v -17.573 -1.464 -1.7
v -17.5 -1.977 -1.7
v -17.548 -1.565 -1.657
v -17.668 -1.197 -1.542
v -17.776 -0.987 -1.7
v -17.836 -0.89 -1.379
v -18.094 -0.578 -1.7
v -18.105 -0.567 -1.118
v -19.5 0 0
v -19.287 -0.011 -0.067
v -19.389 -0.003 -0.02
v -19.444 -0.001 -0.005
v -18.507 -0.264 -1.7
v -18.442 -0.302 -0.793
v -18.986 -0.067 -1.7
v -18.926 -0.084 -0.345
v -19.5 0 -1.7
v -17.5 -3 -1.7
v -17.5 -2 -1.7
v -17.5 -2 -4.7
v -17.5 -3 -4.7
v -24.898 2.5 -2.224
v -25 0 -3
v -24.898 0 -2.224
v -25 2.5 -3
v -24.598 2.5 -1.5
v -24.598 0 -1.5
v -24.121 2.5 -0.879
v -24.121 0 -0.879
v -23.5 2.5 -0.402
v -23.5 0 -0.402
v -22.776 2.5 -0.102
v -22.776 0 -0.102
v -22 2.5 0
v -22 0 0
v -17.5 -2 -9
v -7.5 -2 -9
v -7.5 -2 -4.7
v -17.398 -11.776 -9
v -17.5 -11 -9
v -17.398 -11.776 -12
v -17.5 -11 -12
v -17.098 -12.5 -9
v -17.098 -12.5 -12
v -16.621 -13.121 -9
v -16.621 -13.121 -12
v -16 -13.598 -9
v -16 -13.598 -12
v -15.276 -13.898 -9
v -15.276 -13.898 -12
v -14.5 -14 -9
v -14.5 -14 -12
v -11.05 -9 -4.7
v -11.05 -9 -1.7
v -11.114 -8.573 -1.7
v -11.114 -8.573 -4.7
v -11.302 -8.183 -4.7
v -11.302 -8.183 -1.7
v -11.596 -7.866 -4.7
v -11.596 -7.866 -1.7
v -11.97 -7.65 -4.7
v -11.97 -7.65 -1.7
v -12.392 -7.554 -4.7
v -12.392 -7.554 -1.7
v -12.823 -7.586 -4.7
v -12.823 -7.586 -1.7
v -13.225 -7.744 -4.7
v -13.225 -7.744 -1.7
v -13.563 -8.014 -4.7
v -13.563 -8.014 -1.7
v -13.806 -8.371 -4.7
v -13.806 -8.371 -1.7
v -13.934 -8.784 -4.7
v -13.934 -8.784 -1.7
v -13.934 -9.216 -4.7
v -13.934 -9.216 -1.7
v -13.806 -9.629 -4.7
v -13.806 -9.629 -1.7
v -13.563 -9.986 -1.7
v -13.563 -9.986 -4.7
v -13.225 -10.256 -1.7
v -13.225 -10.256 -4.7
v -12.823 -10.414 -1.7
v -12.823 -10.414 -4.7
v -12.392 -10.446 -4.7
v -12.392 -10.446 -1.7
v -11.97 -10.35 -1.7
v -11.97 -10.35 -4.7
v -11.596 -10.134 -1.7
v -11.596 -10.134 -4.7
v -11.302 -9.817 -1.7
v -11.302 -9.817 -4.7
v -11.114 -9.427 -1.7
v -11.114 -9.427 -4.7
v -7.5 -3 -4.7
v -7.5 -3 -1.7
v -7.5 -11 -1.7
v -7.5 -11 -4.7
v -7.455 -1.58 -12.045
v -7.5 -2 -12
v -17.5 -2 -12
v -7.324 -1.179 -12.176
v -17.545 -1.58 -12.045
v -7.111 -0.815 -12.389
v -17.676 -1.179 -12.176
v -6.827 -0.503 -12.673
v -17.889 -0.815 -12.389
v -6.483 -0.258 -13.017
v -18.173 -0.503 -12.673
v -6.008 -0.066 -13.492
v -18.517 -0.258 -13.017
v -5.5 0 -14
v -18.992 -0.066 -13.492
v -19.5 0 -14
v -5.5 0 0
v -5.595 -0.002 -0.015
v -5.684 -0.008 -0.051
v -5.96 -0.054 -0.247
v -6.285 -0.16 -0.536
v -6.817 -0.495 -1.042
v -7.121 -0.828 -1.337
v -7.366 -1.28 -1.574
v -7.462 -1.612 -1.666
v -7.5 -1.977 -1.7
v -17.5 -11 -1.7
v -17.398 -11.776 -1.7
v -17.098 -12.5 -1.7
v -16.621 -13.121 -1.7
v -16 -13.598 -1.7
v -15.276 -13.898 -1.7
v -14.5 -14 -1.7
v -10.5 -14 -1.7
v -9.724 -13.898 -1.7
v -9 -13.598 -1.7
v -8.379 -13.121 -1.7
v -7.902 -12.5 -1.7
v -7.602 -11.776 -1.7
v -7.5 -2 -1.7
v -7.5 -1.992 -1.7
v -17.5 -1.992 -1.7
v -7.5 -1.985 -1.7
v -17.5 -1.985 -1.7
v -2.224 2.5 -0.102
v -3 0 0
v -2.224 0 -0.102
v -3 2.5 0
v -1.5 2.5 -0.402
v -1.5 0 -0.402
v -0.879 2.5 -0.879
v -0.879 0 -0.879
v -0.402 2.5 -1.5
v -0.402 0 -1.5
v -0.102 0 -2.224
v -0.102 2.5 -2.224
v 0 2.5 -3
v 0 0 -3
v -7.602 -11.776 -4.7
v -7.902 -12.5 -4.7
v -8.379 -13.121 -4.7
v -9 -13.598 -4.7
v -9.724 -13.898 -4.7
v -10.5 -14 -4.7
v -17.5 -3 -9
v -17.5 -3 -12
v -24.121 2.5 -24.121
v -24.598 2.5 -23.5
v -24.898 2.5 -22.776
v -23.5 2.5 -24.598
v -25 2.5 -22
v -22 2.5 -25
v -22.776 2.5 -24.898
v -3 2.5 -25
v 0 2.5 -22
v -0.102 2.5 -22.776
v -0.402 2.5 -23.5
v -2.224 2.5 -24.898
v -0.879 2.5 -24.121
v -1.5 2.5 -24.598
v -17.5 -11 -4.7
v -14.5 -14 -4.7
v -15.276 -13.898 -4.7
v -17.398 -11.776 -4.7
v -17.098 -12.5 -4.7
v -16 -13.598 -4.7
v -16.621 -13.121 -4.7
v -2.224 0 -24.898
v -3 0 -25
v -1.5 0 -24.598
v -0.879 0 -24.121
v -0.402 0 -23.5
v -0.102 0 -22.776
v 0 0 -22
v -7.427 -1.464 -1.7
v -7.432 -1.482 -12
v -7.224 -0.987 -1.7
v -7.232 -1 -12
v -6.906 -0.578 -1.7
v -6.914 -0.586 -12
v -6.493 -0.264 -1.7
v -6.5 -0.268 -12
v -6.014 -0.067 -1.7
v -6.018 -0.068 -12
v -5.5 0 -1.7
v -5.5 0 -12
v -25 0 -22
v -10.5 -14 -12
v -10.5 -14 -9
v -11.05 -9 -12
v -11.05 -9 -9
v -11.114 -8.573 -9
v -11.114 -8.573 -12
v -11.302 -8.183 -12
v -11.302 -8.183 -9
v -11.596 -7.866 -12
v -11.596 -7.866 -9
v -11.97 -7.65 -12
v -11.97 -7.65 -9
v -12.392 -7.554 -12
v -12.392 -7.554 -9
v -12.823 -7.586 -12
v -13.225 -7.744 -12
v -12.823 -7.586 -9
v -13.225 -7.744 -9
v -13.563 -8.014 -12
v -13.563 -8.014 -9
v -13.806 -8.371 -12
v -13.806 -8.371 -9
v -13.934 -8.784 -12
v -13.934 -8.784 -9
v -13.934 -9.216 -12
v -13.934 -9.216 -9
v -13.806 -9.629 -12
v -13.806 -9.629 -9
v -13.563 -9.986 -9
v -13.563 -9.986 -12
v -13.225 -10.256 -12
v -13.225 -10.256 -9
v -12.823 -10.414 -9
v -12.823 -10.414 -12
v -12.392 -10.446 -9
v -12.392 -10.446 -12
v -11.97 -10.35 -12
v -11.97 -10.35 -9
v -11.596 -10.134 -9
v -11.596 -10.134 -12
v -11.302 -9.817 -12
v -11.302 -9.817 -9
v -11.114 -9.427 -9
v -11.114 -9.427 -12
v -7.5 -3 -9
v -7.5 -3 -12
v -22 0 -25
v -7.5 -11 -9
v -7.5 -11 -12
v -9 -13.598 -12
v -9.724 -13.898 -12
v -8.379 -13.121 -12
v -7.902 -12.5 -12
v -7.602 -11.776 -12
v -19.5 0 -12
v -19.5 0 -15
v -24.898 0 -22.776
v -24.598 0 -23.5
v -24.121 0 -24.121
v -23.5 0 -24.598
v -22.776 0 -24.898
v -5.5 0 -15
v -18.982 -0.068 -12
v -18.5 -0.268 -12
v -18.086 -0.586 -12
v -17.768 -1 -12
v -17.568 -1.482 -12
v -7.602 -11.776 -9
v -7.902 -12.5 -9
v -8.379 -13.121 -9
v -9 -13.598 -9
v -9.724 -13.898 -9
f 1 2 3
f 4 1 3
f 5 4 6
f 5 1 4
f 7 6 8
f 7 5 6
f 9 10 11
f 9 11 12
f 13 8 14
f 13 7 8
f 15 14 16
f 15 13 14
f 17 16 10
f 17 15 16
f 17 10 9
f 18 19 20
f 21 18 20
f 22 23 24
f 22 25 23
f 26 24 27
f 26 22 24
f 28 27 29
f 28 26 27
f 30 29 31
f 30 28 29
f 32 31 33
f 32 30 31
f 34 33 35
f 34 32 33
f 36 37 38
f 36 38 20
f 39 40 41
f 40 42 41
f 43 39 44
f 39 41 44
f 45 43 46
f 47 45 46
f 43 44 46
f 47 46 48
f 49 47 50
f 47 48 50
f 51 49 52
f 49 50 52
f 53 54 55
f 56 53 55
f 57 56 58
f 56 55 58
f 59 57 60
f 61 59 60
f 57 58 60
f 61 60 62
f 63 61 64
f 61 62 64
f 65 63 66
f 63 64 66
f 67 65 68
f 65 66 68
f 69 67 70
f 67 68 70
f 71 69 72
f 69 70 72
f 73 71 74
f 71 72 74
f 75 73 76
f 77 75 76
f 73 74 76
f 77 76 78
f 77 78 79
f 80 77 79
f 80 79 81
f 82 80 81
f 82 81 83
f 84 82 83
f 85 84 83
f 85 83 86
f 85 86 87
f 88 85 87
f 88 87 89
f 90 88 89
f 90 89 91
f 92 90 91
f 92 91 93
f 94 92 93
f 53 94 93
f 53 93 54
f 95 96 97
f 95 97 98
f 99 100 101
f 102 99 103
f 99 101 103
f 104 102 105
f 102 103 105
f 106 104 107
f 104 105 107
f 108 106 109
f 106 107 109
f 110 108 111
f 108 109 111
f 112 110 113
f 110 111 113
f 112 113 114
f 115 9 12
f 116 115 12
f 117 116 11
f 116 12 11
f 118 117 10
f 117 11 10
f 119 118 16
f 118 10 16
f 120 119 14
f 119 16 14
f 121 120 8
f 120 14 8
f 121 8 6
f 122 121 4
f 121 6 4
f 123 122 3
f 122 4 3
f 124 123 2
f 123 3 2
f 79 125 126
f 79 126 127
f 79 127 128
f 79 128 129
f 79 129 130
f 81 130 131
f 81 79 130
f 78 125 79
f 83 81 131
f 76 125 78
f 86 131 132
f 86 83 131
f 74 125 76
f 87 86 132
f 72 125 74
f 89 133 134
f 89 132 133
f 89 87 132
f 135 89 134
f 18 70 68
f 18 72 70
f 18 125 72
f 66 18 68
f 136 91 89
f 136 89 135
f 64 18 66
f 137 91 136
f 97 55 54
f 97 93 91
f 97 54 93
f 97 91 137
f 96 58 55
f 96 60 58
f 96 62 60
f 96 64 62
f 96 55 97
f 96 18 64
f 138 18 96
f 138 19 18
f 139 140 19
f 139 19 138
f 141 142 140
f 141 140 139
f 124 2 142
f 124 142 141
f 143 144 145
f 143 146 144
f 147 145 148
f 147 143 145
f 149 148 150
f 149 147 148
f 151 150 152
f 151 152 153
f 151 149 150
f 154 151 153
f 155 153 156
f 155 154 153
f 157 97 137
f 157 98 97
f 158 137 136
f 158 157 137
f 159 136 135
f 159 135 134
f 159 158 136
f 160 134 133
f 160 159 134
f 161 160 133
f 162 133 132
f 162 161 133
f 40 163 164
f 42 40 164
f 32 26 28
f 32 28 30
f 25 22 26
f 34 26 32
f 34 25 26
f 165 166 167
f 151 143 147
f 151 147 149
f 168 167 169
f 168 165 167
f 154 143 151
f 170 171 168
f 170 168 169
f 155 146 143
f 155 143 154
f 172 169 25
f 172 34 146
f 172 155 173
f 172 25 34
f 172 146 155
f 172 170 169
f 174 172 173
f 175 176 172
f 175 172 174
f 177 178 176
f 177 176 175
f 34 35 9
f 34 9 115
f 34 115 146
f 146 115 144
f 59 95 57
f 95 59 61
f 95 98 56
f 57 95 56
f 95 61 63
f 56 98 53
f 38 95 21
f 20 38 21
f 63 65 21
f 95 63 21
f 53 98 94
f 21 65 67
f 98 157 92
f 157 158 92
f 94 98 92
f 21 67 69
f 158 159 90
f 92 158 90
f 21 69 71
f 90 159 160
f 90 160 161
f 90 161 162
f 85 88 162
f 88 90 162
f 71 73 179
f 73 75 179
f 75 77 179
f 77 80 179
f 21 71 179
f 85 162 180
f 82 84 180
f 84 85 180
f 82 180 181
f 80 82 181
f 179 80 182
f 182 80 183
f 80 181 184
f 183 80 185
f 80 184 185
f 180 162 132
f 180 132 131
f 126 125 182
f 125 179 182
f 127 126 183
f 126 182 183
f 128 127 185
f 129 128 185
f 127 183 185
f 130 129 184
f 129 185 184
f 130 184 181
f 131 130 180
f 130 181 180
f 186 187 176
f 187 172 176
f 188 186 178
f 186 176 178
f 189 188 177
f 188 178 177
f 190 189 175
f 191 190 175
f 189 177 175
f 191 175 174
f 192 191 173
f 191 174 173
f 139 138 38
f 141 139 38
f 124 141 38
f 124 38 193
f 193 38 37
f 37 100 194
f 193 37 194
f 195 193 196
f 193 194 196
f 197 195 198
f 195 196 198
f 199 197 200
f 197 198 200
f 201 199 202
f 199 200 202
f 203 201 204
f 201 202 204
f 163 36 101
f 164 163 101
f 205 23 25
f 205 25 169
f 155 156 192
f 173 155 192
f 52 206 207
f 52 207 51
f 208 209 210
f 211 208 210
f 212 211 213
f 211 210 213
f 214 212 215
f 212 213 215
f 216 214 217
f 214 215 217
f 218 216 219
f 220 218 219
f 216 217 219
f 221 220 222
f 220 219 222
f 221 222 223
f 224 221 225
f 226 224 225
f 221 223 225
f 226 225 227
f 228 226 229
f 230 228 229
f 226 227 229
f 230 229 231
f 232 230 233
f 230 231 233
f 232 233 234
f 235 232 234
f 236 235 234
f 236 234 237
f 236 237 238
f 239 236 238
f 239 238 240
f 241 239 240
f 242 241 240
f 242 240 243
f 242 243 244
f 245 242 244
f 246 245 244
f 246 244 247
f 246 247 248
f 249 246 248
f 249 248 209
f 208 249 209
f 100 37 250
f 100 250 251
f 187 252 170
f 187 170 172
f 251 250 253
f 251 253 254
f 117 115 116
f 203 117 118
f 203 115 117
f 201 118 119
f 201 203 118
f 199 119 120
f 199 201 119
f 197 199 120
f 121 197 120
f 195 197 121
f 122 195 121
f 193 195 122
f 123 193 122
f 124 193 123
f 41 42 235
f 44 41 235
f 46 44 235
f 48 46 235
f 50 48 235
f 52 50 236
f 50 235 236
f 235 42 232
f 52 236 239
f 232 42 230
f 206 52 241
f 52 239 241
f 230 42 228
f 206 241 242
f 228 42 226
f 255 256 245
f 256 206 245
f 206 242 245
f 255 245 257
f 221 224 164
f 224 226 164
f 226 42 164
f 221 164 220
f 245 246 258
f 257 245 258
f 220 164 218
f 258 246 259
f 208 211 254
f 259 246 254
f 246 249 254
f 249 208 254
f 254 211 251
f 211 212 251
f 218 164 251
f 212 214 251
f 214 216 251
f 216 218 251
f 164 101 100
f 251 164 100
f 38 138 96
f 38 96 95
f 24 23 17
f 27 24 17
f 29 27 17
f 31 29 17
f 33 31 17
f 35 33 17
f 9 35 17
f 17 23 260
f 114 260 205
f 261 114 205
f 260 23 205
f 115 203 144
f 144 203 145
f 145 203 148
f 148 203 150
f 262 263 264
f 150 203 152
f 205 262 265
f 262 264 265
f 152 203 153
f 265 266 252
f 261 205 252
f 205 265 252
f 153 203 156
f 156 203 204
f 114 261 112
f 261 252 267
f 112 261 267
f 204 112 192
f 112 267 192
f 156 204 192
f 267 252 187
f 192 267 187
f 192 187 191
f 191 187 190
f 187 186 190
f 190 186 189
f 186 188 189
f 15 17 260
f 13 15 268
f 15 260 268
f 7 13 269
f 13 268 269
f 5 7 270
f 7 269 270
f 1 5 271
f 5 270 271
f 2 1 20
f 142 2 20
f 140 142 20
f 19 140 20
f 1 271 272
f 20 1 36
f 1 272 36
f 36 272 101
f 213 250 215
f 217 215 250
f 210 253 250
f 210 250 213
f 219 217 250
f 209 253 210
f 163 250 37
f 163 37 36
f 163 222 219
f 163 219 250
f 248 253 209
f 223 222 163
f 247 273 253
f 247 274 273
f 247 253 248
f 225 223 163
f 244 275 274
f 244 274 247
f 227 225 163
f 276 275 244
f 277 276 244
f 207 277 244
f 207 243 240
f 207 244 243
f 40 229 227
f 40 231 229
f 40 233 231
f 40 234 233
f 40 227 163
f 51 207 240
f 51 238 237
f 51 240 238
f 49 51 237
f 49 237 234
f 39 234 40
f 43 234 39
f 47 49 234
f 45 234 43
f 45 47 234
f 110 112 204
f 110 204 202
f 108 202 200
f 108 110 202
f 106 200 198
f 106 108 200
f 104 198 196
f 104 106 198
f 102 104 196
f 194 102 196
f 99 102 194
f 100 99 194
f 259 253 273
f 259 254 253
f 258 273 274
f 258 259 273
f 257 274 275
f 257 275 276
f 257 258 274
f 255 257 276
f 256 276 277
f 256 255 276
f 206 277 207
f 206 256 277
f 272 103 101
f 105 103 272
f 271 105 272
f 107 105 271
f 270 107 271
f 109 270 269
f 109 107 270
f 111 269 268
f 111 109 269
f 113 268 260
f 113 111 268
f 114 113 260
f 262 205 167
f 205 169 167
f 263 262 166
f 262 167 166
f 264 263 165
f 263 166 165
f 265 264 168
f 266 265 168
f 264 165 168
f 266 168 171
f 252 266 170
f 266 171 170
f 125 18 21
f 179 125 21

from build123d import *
from build123d.topology import SkipClean

# Parameters (mm, degrees)
SKETCH1_W           = 25
SKETCH1_H           = 25
BOSS_EXTRUDE1_DEPTH = 2.5
SKETCH2_W           = 10
SKETCH2_H           = 10.3
BOSS_EXTRUDE2_DEPTH = 14
SKETCH3_W           = 10
SKETCH3_H           = 4.3
CUT_EXTRUDE1_DEPTH  = 12
SKETCH4_R           = 1.45
CUT_EXTRUDE2_DEPTH  = 37.930881387
FILLET1_R           = 3
FILLET2_R           = 3
FILLET3_START       = -12
FILLET3_DEPTH       = 10.3
FILLET3_START_2     = -19.5000001
FILLET3_2_DEPTH     = 14.0000001
FILLET3_START_3     = -15
FILLET3_3_DEPTH     = 15.00001976


with BuildPart() as part:
    # Sketch1 → Boss-Extrude1 (new body)
    with BuildSketch(Plane(origin=(0, 0, 0), x_dir=(1, 0, 0), z_dir=(0, 1, 0))):
        with Locations((-12.5, 12.5)):
            Rectangle(SKETCH1_W, SKETCH1_H)
    extrude(amount=BOSS_EXTRUDE1_DEPTH)

    # Sketch2 → Boss-Extrude2 (add)
    with BuildSketch(Plane(origin=(0, 0, 0), x_dir=(-1, 0, 0), z_dir=(0, -1, 0))):
        with Locations((12.5, 6.85)):
            Rectangle(SKETCH2_W, SKETCH2_H)
    extrude(amount=BOSS_EXTRUDE2_DEPTH)

    # Sketch3 → Cut-Extrude1 (cut)
    with BuildSketch(Plane(origin=(0, -14, 0), x_dir=(-1, 0, 0), z_dir=(0, -1, 0))):
        with Locations((12.5, 6.85)):
            Rectangle(SKETCH3_W, SKETCH3_H)
    extrude(amount=-CUT_EXTRUDE1_DEPTH, mode=Mode.SUBTRACT)

    # Sketch4 → Cut-Extrude2 (cut, through all)
    with BuildSketch(Plane.XY.offset(-1.7)):
        with Locations((-12.5, -9)):
            Circle(SKETCH4_R)
    extrude(amount=-CUT_EXTRUDE2_DEPTH, mode=Mode.SUBTRACT)

    # Fillet1
    fillet1_edges = [part.edges().sort_by_distance(p)[0] for p in [
        (-17.5, -14, -3.2),
        (-7.5, -14, -10.5),
        (-17.5, -14, -10.5),
        (-7.5, -14, -3.2),
    ]]
    fillet(fillet1_edges, radius=FILLET1_R)

    # Fillet2
    fillet2_edges = [part.edges().sort_by_distance(p)[0] for p in [
        (0, 1.25, 0),
        (-25, 1.25, 0),
        (-25, 1.25, -25),
        (0, 1.25, -25),
    ]]
    fillet(fillet2_edges, radius=FILLET2_R)

    # Fillet3: read off the stored shape, not the designer's step
    # Fillet3 outline → Fillet3 (add)
    with BuildSketch(Plane.XY.offset(FILLET3_START)):
        with BuildLine():
            Line((-7.5, 0), (-7.5, -2))
            ThreePointArc((-7.5, -2), (-6.914213562, -0.585786438), (-5.5, 0))
            Line((-5.5, 0), (-7.5, 0))
        make_face()
        with BuildLine():
            Line((-17.5, -2), (-17.5, 0))
            Line((-17.5, 0), (-19.5, 0))
            ThreePointArc((-19.5, 0), (-18.085786438, -0.585786438), (-17.5, -2))
        make_face()
    extrude(amount=FILLET3_DEPTH)

    # Fillet3 2 outline → Fillet3 2 (add)
    with BuildSketch(Plane.YZ.offset(FILLET3_START_2)):
        with BuildLine():
            Line((0, -1.7), (1.1224e-05, 7.3987e-05))
            ThreePointArc((1.1224e-05, 7.3987e-05), (-0.67350314, -1.216550696), (-1.977371993, -1.7))
            Line((-1.977371993, -1.7), (0, -1.7))
        make_face()
        with BuildLine():
            Line((0, -14), (0, -12))
            Line((0, -12), (-2, -12))
            ThreePointArc((-2, -12), (-0.585786438, -12.585786438), (0, -14))
        make_face()
    extrude(amount=FILLET3_2_DEPTH)

    # Fillet3 3 outline → Fillet3 3 (cut)
    with SkipClean():  # the faces are left unmerged after this step: merging them gives an invalid solid
        with BuildSketch(Plane.XY.offset(FILLET3_START_3)):
            with BuildLine():
                ThreePointArc((-5.5, 0), (-6.914213562, -0.585786438), (-7.5, -2))
                Line((-7.5, -2), (-7.500000001, -3))
                Line((-7.500000001, -3), (-5.5, -3))
                Line((-5.5, -3), (-5.5, -2))
                Line((-5.5, -2), (-5.5, -1.977371993))
                Line((-5.5, -1.977371993), (-5.5, 0))
            make_face()
            with BuildLine():
                Line((-19.5000001, -3), (-17.499999999, -3))
                Line((-17.499999999, -3), (-17.5, -2))
                ThreePointArc((-17.5, -2), (-18.085786438, -0.585786438), (-19.5, 0))
                Line((-19.5, 0), (-19.5000001, -1.977371993))
                Line((-19.5000001, -1.977371993), (-19.5000001, -2))
                Line((-19.5000001, -2), (-19.5000001, -3))
            make_face()
        extrude(amount=FILLET3_3_DEPTH, mode=Mode.SUBTRACT)


solid = part.part
